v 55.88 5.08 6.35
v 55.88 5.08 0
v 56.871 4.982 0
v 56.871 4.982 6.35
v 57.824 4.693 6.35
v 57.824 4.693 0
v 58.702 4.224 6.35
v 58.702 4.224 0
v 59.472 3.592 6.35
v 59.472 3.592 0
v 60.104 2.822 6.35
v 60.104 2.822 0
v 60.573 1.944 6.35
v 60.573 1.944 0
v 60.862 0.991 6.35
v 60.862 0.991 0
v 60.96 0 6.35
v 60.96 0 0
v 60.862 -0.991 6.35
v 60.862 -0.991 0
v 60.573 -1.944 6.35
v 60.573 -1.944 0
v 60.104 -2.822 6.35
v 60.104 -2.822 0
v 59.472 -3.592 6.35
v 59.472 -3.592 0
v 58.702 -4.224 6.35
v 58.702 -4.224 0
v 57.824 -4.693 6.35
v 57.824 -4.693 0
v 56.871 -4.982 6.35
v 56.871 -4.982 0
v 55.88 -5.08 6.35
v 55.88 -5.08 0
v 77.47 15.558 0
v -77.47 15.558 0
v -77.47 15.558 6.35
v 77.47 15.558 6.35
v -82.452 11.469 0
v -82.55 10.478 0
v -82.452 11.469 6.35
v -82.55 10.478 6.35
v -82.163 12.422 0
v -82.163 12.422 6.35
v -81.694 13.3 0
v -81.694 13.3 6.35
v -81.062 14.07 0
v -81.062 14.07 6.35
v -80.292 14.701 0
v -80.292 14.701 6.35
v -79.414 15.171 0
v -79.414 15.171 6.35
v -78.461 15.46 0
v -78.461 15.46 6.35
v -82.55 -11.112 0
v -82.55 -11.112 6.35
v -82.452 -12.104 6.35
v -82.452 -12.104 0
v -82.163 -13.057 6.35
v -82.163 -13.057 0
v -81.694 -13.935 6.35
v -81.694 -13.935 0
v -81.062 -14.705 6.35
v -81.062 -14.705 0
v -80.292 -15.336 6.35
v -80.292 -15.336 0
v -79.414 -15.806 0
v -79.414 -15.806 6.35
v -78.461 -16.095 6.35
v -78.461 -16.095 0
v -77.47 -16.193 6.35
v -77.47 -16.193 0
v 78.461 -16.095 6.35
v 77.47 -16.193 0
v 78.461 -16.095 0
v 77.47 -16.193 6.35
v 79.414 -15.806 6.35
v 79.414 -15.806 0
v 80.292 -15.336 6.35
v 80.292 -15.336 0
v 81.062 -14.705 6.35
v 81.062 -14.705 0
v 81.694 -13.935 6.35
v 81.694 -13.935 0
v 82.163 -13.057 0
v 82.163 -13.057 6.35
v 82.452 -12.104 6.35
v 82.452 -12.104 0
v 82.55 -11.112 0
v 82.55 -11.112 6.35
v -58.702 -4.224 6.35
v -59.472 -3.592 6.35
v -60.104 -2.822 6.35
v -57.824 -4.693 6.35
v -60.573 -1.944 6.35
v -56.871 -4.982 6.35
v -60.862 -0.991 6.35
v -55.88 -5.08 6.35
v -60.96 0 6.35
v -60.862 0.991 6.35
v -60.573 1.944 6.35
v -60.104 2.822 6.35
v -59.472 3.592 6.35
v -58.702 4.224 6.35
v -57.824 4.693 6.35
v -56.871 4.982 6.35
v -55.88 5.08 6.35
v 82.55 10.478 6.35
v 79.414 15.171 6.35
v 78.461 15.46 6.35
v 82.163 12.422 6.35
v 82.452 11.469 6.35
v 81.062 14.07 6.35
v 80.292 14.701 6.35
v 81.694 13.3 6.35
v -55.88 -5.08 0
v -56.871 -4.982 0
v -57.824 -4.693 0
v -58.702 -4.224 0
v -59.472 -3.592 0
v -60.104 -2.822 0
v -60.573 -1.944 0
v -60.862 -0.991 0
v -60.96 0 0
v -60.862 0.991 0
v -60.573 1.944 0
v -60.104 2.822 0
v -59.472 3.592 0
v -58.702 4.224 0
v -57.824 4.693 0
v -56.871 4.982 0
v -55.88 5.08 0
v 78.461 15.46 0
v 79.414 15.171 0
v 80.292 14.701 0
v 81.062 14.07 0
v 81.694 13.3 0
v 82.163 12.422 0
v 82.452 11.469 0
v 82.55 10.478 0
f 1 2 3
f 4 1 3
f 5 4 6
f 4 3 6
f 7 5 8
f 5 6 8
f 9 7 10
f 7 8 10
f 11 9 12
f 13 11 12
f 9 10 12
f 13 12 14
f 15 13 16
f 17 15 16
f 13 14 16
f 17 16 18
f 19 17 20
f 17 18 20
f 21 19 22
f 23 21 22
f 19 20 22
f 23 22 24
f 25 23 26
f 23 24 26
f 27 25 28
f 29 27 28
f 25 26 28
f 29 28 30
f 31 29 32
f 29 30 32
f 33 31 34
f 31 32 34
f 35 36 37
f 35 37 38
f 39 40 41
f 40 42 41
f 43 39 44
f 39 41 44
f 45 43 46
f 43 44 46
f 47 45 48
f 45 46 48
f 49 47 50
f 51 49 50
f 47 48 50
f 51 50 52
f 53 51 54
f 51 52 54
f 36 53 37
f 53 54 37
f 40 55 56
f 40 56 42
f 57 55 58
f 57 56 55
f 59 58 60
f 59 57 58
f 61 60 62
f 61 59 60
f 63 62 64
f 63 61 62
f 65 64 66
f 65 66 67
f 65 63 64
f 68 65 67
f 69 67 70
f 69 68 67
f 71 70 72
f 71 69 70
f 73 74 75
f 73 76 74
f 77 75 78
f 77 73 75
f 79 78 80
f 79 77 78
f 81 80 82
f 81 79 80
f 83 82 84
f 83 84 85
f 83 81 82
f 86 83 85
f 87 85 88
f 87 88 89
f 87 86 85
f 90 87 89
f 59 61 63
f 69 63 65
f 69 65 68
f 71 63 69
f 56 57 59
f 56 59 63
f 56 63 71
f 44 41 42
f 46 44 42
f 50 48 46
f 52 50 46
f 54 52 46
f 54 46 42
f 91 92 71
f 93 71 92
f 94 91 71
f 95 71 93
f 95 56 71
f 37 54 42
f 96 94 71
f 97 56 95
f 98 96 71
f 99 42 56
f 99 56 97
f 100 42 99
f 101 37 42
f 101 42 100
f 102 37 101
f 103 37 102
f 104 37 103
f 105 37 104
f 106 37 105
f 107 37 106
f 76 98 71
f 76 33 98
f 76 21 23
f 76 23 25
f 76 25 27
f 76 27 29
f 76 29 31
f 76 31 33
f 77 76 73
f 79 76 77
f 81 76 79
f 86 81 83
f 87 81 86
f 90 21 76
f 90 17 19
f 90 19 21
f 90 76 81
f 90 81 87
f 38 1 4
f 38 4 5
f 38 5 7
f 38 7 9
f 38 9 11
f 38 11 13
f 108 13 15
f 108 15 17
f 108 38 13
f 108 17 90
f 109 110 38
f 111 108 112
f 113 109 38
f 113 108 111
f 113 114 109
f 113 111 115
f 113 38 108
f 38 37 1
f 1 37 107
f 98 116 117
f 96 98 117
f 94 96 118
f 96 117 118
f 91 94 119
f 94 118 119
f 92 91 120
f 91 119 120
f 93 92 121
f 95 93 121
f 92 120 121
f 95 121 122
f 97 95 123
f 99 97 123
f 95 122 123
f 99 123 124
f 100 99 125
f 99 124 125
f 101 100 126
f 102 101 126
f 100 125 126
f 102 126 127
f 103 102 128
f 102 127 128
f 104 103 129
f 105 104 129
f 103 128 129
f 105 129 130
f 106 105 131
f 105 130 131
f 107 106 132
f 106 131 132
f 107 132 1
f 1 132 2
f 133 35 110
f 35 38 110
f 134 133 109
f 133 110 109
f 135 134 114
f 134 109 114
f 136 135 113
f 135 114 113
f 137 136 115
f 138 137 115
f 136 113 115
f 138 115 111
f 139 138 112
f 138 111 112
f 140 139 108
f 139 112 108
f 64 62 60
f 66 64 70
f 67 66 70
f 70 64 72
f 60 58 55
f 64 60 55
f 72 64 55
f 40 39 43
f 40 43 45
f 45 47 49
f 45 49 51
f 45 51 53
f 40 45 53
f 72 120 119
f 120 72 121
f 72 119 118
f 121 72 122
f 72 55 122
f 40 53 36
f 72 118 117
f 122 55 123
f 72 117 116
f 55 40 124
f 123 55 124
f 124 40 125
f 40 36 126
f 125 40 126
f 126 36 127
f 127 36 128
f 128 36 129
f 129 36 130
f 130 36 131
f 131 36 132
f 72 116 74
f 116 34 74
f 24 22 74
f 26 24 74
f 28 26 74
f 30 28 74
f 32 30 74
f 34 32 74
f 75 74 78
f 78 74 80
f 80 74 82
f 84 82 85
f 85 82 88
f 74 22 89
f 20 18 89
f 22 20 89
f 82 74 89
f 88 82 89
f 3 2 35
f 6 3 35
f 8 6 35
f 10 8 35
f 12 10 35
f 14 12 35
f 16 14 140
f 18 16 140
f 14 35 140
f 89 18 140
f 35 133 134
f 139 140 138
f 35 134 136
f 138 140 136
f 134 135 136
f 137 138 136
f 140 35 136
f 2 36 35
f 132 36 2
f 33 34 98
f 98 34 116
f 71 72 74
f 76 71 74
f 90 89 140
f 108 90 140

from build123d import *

# Parameters (mm, degrees)
F1_W     = 165.1
F1_H     = 31.75
F2_DEPTH = 6.35
F3_R     = 5.08


# Not quite as in the source:
# - a variable given as a bare number and used for a length is read in inches; the dataset says mm whatever the document's units were


with BuildPart() as f2:
    # F1 (on Top) → F2 (new body)
    with BuildSketch(Plane.XY):
        with Locations((0, -0.3175)):
            Rectangle(F1_W, F1_H)
        with BuildLine():
            ThreePointArc((-55.88, -5.08), (-60.96, 0), (-55.88, 5.08))
            Line((-55.88, 5.08), (0, 5.08))
            Line((0, 5.08), (55.88, 5.08))
            ThreePointArc((55.88, 5.08), (60.96, 0), (55.88, -5.08))
            Line((55.88, -5.08), (0, -5.08))
            Line((0, -5.08), (-55.88, -5.08))
        make_face(mode=Mode.SUBTRACT)
    extrude(amount=F2_DEPTH)

    # F3
    f3_edges = [f2.edges().sort_by_distance(p)[0] for p in [
        (-82.55, 15.5575, 3.175),
        (-82.55, -16.1925, 3.175),
        (82.55, 15.5575, 3.175),
        (82.55, -16.1925, 3.175),
    ]]
    fillet(f3_edges, radius=F3_R)


solid = f2.part
